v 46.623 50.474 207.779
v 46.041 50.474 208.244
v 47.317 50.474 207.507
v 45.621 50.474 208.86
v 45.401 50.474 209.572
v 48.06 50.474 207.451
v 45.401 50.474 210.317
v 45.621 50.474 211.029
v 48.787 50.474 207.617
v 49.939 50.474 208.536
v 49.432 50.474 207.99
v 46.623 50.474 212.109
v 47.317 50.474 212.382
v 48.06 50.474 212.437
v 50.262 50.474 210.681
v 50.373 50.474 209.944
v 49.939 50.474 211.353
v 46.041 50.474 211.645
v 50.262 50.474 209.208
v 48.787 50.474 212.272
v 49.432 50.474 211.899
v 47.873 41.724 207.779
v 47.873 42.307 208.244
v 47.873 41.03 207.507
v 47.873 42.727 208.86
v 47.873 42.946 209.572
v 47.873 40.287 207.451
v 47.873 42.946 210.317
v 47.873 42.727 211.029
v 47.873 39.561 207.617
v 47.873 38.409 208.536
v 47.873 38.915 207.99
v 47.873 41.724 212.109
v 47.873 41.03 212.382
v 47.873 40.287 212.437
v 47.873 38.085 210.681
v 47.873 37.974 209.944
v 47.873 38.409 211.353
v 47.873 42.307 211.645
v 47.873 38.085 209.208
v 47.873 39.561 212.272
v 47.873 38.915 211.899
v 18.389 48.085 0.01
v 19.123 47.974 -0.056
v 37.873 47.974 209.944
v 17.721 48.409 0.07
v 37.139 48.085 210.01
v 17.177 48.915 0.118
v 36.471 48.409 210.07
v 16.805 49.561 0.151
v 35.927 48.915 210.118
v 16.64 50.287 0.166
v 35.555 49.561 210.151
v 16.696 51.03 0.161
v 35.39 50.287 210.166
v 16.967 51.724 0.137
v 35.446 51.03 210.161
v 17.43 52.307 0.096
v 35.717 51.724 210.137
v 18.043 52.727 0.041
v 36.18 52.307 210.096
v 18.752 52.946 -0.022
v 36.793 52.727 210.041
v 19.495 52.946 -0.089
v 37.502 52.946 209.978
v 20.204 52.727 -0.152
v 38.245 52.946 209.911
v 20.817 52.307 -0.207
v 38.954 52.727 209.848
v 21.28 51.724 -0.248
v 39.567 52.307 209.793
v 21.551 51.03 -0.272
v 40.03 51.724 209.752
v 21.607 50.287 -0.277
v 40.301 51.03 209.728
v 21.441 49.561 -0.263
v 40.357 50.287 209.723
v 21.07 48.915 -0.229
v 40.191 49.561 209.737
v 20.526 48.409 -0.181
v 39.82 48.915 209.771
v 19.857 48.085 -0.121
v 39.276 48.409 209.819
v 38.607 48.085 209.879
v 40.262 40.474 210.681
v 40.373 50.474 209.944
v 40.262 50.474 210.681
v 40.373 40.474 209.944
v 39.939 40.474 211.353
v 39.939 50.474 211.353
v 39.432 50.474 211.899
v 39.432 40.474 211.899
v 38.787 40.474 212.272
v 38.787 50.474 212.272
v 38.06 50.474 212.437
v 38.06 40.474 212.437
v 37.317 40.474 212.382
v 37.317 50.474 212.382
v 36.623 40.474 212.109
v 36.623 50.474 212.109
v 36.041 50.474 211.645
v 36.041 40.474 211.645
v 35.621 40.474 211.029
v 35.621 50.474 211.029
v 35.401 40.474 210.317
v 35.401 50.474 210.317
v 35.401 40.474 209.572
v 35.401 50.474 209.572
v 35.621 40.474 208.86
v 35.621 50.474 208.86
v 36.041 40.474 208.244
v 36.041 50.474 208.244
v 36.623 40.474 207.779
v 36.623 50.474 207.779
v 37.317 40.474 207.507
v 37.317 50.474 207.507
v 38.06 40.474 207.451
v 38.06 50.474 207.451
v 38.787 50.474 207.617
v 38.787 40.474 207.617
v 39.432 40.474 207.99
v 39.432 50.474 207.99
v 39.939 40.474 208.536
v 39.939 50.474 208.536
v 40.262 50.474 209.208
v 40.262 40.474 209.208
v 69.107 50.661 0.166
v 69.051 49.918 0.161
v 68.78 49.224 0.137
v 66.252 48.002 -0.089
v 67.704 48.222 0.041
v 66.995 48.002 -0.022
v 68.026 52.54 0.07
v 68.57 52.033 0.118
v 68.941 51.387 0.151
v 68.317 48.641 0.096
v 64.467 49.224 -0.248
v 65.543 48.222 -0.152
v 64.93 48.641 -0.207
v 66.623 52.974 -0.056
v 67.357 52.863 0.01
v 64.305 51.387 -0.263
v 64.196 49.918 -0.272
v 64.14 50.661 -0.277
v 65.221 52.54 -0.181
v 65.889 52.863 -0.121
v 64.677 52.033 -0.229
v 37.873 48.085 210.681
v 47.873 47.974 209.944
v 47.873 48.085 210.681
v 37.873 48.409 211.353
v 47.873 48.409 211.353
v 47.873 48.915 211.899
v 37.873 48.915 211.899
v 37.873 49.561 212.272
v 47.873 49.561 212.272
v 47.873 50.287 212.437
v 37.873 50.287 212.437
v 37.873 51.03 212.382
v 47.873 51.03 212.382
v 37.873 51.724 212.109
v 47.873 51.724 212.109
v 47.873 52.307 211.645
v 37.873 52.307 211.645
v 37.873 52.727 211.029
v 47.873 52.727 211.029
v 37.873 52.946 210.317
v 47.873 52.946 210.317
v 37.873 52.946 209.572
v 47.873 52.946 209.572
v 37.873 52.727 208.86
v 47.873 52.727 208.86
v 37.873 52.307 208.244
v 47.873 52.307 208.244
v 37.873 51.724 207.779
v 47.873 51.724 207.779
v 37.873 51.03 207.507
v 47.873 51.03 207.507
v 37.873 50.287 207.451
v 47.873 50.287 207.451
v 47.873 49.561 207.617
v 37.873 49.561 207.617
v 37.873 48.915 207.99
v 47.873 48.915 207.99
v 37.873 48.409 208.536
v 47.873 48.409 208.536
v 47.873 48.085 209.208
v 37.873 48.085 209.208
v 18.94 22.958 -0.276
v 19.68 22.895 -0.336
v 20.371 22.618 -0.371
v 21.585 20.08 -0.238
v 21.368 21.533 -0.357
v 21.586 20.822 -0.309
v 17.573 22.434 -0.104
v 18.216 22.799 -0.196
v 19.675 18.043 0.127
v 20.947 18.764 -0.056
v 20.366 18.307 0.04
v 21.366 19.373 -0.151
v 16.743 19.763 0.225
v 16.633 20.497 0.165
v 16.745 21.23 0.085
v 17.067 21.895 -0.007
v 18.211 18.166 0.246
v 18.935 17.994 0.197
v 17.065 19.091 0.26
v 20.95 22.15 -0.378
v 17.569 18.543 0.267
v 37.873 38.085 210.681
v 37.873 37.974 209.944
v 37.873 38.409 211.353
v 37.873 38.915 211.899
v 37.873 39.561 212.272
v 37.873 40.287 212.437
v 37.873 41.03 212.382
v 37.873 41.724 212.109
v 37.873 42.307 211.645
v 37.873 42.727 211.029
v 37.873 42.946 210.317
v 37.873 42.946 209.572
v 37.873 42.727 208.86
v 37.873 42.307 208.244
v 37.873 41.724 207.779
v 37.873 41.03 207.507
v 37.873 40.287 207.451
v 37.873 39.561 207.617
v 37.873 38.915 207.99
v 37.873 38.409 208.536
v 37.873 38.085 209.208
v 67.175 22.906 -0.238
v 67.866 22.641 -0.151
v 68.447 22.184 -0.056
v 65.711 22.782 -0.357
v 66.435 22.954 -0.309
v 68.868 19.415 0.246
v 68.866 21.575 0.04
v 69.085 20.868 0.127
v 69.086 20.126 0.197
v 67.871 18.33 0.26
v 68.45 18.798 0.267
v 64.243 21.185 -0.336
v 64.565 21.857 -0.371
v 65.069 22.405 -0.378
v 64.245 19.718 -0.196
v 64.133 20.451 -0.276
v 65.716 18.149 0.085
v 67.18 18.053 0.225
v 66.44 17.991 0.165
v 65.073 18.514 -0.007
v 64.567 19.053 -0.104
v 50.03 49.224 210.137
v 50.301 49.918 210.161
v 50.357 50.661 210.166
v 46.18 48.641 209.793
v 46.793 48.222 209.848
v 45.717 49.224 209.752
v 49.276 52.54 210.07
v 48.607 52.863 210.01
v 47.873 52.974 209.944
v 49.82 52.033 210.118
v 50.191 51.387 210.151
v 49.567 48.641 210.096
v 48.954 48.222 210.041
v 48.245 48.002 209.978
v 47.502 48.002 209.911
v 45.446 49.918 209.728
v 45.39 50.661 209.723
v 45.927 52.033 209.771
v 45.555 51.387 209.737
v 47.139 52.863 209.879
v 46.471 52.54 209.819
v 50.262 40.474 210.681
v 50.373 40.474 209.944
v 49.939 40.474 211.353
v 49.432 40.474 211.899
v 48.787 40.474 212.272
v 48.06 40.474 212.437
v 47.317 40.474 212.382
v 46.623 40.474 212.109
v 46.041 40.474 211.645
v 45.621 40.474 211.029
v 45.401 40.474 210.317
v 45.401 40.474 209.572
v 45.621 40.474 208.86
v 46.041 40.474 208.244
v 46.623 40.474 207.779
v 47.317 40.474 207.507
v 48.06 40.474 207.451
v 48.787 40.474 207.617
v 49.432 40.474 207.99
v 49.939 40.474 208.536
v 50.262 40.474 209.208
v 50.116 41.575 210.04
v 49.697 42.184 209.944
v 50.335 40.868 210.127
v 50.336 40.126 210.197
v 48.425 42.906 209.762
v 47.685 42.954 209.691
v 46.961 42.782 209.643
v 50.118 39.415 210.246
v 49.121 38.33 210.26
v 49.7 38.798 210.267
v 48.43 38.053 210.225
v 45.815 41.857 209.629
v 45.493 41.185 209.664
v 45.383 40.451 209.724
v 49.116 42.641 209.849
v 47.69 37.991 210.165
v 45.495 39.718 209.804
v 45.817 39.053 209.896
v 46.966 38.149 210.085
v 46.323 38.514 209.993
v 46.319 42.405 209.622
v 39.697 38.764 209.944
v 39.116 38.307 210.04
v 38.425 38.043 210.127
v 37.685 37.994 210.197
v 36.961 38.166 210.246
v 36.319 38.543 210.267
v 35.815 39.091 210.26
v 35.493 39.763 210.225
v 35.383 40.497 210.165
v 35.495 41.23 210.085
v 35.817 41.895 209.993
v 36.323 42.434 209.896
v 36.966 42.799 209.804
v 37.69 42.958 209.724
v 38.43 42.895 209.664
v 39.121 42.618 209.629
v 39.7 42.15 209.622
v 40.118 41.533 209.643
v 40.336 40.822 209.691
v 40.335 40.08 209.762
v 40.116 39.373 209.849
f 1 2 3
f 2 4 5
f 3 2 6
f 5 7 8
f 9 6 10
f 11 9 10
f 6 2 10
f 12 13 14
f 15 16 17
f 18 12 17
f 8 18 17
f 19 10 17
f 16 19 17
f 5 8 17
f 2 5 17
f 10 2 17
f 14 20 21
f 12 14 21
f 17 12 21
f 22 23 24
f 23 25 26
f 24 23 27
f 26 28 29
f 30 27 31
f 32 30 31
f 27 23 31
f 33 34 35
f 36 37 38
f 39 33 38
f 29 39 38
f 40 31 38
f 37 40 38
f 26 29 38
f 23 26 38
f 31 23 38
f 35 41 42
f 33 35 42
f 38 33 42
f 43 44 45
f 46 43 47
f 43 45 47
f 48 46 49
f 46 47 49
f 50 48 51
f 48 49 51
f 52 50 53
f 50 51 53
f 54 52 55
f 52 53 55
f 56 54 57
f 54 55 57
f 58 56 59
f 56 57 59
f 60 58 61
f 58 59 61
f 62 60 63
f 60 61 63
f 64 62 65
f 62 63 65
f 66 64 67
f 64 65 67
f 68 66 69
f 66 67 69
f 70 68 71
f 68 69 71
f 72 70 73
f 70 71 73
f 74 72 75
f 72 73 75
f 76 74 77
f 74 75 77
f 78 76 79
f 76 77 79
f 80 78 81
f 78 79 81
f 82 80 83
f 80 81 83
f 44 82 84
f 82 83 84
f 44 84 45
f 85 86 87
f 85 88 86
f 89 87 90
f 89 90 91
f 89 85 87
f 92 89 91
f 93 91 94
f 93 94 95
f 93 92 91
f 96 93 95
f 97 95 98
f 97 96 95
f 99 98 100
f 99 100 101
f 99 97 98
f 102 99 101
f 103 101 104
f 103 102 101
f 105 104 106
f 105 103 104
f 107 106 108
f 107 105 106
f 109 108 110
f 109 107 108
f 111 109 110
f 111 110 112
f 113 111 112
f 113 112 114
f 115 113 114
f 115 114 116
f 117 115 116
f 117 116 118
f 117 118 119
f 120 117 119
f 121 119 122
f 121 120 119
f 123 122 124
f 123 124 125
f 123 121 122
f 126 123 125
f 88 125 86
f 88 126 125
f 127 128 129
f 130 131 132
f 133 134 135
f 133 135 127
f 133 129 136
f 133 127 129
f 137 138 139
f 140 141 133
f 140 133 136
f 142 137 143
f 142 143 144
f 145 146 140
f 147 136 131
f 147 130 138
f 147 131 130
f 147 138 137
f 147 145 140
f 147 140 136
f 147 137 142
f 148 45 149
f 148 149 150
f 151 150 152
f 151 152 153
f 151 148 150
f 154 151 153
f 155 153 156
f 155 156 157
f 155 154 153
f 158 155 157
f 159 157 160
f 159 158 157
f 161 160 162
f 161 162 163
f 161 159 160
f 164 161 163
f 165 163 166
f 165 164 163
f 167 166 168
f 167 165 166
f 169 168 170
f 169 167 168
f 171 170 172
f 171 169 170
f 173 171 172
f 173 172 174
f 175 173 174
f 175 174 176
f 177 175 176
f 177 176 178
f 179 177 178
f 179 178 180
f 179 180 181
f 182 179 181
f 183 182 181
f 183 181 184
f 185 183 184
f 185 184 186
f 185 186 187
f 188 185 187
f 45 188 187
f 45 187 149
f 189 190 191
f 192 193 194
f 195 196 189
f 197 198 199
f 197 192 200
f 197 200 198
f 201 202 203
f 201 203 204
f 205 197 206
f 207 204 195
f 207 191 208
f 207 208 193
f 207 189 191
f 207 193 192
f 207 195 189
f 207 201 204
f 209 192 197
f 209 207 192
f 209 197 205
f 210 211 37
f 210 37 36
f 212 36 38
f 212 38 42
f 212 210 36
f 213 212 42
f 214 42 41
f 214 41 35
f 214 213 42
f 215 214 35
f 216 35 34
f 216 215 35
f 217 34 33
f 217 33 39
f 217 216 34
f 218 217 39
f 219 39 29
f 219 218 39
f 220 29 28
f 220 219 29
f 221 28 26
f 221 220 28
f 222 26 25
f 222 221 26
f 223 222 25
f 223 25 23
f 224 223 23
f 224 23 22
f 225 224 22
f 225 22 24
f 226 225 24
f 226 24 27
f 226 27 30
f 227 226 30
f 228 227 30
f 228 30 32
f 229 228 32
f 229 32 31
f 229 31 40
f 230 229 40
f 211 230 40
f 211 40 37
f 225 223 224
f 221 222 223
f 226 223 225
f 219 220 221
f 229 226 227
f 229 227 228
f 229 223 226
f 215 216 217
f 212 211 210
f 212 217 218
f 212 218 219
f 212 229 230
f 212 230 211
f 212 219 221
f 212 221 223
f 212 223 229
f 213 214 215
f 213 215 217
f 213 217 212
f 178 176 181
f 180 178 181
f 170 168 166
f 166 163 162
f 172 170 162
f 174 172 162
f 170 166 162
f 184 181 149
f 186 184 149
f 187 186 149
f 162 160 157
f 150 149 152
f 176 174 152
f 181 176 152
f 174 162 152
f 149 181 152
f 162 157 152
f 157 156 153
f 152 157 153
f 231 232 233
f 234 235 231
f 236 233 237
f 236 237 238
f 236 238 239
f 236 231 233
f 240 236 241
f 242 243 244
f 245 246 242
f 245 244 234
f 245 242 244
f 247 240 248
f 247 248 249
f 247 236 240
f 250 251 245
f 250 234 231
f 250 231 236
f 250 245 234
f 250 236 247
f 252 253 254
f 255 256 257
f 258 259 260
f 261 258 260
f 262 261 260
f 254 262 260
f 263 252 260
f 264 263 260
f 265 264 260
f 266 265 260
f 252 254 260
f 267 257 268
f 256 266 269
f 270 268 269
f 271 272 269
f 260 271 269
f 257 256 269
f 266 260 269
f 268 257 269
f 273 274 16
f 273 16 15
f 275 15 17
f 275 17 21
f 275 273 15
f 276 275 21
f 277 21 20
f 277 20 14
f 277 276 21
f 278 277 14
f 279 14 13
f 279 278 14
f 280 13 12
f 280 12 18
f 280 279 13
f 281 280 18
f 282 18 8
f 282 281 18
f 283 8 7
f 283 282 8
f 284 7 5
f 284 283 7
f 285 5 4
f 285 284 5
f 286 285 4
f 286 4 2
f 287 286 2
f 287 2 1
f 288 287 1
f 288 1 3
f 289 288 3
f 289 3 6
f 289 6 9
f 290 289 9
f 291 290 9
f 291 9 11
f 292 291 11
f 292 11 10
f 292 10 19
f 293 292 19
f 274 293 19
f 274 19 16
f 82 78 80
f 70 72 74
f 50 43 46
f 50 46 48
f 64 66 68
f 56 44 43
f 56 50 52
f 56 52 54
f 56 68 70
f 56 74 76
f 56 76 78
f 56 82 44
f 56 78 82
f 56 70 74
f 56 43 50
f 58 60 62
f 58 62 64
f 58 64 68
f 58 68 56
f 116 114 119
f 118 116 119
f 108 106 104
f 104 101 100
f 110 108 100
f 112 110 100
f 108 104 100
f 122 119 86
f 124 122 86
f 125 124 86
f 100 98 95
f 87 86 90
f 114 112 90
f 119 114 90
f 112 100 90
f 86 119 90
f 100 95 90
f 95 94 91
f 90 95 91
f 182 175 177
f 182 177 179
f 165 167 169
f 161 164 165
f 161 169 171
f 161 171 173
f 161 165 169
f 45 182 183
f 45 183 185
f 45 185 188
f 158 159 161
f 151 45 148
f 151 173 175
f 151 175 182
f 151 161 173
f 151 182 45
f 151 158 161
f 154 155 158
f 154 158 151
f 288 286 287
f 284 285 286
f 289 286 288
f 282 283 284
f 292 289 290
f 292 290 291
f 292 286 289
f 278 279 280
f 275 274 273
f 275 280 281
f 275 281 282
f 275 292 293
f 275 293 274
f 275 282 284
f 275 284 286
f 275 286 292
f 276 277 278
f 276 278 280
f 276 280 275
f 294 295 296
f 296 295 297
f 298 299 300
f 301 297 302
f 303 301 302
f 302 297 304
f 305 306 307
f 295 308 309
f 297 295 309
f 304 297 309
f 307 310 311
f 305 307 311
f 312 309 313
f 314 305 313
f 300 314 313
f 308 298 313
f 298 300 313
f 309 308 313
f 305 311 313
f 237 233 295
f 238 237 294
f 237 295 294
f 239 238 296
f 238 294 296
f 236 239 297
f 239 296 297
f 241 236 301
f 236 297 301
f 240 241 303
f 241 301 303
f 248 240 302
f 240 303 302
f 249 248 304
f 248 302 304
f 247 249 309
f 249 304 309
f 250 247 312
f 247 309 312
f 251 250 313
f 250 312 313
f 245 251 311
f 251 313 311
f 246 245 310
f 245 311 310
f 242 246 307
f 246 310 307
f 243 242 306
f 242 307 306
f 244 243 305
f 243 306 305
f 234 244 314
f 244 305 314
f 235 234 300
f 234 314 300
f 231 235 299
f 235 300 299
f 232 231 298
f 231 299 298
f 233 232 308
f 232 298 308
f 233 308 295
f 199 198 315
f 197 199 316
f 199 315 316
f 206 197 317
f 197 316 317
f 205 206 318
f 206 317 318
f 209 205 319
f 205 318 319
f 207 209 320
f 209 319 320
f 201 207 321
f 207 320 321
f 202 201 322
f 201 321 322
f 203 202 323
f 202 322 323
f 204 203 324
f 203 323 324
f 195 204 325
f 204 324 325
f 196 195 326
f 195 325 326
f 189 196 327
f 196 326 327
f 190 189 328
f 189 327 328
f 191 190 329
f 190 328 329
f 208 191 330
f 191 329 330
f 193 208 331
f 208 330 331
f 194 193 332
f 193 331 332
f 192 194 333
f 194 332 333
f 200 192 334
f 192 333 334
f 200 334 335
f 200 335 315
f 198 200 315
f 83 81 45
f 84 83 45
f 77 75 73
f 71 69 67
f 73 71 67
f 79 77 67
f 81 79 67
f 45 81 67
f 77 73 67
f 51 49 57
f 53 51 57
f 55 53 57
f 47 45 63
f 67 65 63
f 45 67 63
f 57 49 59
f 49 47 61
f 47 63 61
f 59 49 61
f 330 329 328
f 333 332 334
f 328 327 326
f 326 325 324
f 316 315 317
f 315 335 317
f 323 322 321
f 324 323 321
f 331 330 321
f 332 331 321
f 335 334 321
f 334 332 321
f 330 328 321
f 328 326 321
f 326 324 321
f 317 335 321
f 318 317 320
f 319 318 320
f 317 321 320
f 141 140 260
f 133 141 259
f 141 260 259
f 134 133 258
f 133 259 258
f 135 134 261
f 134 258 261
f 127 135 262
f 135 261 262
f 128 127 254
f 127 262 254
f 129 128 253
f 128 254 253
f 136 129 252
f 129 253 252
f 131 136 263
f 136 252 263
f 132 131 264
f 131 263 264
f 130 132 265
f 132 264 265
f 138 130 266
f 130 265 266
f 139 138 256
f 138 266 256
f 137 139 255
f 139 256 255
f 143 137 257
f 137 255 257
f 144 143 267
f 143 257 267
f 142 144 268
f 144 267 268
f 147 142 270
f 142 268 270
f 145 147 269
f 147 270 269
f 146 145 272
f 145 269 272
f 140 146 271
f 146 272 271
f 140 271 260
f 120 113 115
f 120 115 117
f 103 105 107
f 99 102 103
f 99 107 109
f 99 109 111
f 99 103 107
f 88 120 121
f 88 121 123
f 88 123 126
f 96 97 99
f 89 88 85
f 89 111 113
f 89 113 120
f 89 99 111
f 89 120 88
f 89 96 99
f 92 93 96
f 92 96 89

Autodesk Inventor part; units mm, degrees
sketch3d "3D Sketch1"
ref_plane "Work Plane1" through (19.1234, 50.4741, -0.0556) normal (-0.0889319, 0, -0.9960377) x (0, -1, 0)
ref_plane "Work Plane2" through (66.6234, 50.4741, -0.0556) normal (0.0889319, 0, -0.9960377) x (0, 1, 0)
ref_plane "Work Plane3" through (19.1234, 20.4741, -0.0556) normal (-0.0885345, -0.0944368, -0.9915863) x (0.7295372, -0.6839411, 0)
ref_plane "Work Plane4" through (66.6234, 20.4741, -0.0556) normal (0.0885345, -0.0944368, -0.9915863) x (0.7295372, 0.6839411, 0)
sketch "Sketch1" plane through (19.1234, 50.4741, -0.0556) normal (-0.0889319, 0, -0.9960377) x (0, -1, 0)
  circle A0 centre (0, 0) radius 2.5
  point P0 (50.4741, 19.0525)
  dimension "d20" = 5
sketch "Sketch2" plane through (66.6234, 50.4741, -0.0556) normal (0.0889319, 0, -0.9960377) x (0, 1, 0)
  circle A0 centre (0, 0) radius 2.5
  point P0 (-50.4741, -66.3545)
  dimension "d21" = 5
sketch "Sketch3" plane through (19.1234, 20.4741, -0.0556) normal (-0.0885345, -0.0944368, -0.9915863) x (0.7295372, -0.6839411, 0)
  circle A0 centre (0, 0) radius 2.5
  point P0 (0.0519, 27.7874)
  dimension "d22" = 5
sketch "Sketch4" plane through (66.6234, 20.4741, -0.0556) normal (0.0885345, -0.0944368, -0.9915863) x (0.7295372, 0.6839411, 0)
  circle A0 centre (0, 0) radius 2.5
  point P0 (-62.6073, -30.3649)
  dimension "d23" = 5
sketch3d "3D Sketch2"
  line L0 (19.1234, 50.4741, -0.0556) -> (37.8734, 50.4741, 209.9444)
  dimension "d11" = 210
  dimension "d12" = 37.5
  dimension "d16" = 40
  dimension "d17" = 10
  dimension "d18" = 10
  dimension "d19" = 10
sweep "Sweep1" add profiles "Sketch1" path "3D Sketch2"
sketch3d "3D Sketch2 for Sweep2"
  line L0 (66.6234, 50.4741, -0.0556) -> (47.8734, 50.4741, 209.9444)
  dimension "d11" = 210
  dimension "d12" = 37.5
  dimension "d16" = 40
  dimension "d17" = 10
  dimension "d18" = 10
  dimension "d19" = 10
sweep "Sweep2" add profiles "Sketch2" path "3D Sketch2 for Sweep2" separate body
sketch3d "3D Sketch2 for Sweep3"
  line L0 (19.1234, 20.4741, -0.0556) -> (37.8734, 40.4741, 209.9444)
  dimension "d11" = 210
  dimension "d12" = 37.5
  dimension "d16" = 40
  dimension "d17" = 10
  dimension "d18" = 10
  dimension "d19" = 10
sweep "Sweep3" add profiles "Sketch3" path "3D Sketch2 for Sweep3" separate body
sketch3d "3D Sketch2 for Sweep4"
  line L0 (66.6234, 20.4741, -0.0556) -> (47.8734, 40.4741, 209.9444)
  dimension "d11" = 210
  dimension "d12" = 37.5
  dimension "d16" = 40
  dimension "d17" = 10
  dimension "d18" = 10
  dimension "d19" = 10
sweep "Sweep4" add profiles "Sketch4" path "3D Sketch2 for Sweep4" separate body
ref_plane "Work Plane5" through (37.8734, 50.4741, 209.9444) normal (-1, 0, 0) x (0, -1, 0)
ref_plane "Work Plane6" through (37.8734, 40.4741, 209.9444) normal (0, -1, 0) x (1, 0, 0)
sketch "Sketch6" plane through (37.8734, 50.4741, 209.9444) normal (-1, 0, 0) x (0, -1, 0)
  ellipse E0 centre (0, 0) end of major axis (2.5, 0) minor radius 0.2223 construction
  circle A0 centre (0, 0) radius 2.5
  ellipse E1 centre (10, 0) end of major axis (7.5113, -0.237) minor radius 0.2213 construction
  circle A1 centre (10, 0) radius 2.5
  point P0 (50.4741, -209.9444)
  dimension "d34" = 5
  dimension "d35" = 5
extrude "Extrusion1" add sketch "Sketch6" against normal blind 10 separate body
sketch "Sketch7" plane through (37.8734, 40.4741, 209.9444) normal (0, -1, 0) x (1, 0, 0)
  circle A0 centre (0, 0) radius 2.5
  line L0 (12.4901, 0.2223) -> (7.5099, -0.2223) construction
  circle A1 centre (10, 0) radius 2.5
  point P0 (-37.8734, -209.9444)
  dimension "d38" = 5
  dimension "d39" = 5
extrude "Extrusion2" add sketch "Sketch7" against normal blind 10 separate body
properties part number "RCPlaneSkeletonTailRear1"
